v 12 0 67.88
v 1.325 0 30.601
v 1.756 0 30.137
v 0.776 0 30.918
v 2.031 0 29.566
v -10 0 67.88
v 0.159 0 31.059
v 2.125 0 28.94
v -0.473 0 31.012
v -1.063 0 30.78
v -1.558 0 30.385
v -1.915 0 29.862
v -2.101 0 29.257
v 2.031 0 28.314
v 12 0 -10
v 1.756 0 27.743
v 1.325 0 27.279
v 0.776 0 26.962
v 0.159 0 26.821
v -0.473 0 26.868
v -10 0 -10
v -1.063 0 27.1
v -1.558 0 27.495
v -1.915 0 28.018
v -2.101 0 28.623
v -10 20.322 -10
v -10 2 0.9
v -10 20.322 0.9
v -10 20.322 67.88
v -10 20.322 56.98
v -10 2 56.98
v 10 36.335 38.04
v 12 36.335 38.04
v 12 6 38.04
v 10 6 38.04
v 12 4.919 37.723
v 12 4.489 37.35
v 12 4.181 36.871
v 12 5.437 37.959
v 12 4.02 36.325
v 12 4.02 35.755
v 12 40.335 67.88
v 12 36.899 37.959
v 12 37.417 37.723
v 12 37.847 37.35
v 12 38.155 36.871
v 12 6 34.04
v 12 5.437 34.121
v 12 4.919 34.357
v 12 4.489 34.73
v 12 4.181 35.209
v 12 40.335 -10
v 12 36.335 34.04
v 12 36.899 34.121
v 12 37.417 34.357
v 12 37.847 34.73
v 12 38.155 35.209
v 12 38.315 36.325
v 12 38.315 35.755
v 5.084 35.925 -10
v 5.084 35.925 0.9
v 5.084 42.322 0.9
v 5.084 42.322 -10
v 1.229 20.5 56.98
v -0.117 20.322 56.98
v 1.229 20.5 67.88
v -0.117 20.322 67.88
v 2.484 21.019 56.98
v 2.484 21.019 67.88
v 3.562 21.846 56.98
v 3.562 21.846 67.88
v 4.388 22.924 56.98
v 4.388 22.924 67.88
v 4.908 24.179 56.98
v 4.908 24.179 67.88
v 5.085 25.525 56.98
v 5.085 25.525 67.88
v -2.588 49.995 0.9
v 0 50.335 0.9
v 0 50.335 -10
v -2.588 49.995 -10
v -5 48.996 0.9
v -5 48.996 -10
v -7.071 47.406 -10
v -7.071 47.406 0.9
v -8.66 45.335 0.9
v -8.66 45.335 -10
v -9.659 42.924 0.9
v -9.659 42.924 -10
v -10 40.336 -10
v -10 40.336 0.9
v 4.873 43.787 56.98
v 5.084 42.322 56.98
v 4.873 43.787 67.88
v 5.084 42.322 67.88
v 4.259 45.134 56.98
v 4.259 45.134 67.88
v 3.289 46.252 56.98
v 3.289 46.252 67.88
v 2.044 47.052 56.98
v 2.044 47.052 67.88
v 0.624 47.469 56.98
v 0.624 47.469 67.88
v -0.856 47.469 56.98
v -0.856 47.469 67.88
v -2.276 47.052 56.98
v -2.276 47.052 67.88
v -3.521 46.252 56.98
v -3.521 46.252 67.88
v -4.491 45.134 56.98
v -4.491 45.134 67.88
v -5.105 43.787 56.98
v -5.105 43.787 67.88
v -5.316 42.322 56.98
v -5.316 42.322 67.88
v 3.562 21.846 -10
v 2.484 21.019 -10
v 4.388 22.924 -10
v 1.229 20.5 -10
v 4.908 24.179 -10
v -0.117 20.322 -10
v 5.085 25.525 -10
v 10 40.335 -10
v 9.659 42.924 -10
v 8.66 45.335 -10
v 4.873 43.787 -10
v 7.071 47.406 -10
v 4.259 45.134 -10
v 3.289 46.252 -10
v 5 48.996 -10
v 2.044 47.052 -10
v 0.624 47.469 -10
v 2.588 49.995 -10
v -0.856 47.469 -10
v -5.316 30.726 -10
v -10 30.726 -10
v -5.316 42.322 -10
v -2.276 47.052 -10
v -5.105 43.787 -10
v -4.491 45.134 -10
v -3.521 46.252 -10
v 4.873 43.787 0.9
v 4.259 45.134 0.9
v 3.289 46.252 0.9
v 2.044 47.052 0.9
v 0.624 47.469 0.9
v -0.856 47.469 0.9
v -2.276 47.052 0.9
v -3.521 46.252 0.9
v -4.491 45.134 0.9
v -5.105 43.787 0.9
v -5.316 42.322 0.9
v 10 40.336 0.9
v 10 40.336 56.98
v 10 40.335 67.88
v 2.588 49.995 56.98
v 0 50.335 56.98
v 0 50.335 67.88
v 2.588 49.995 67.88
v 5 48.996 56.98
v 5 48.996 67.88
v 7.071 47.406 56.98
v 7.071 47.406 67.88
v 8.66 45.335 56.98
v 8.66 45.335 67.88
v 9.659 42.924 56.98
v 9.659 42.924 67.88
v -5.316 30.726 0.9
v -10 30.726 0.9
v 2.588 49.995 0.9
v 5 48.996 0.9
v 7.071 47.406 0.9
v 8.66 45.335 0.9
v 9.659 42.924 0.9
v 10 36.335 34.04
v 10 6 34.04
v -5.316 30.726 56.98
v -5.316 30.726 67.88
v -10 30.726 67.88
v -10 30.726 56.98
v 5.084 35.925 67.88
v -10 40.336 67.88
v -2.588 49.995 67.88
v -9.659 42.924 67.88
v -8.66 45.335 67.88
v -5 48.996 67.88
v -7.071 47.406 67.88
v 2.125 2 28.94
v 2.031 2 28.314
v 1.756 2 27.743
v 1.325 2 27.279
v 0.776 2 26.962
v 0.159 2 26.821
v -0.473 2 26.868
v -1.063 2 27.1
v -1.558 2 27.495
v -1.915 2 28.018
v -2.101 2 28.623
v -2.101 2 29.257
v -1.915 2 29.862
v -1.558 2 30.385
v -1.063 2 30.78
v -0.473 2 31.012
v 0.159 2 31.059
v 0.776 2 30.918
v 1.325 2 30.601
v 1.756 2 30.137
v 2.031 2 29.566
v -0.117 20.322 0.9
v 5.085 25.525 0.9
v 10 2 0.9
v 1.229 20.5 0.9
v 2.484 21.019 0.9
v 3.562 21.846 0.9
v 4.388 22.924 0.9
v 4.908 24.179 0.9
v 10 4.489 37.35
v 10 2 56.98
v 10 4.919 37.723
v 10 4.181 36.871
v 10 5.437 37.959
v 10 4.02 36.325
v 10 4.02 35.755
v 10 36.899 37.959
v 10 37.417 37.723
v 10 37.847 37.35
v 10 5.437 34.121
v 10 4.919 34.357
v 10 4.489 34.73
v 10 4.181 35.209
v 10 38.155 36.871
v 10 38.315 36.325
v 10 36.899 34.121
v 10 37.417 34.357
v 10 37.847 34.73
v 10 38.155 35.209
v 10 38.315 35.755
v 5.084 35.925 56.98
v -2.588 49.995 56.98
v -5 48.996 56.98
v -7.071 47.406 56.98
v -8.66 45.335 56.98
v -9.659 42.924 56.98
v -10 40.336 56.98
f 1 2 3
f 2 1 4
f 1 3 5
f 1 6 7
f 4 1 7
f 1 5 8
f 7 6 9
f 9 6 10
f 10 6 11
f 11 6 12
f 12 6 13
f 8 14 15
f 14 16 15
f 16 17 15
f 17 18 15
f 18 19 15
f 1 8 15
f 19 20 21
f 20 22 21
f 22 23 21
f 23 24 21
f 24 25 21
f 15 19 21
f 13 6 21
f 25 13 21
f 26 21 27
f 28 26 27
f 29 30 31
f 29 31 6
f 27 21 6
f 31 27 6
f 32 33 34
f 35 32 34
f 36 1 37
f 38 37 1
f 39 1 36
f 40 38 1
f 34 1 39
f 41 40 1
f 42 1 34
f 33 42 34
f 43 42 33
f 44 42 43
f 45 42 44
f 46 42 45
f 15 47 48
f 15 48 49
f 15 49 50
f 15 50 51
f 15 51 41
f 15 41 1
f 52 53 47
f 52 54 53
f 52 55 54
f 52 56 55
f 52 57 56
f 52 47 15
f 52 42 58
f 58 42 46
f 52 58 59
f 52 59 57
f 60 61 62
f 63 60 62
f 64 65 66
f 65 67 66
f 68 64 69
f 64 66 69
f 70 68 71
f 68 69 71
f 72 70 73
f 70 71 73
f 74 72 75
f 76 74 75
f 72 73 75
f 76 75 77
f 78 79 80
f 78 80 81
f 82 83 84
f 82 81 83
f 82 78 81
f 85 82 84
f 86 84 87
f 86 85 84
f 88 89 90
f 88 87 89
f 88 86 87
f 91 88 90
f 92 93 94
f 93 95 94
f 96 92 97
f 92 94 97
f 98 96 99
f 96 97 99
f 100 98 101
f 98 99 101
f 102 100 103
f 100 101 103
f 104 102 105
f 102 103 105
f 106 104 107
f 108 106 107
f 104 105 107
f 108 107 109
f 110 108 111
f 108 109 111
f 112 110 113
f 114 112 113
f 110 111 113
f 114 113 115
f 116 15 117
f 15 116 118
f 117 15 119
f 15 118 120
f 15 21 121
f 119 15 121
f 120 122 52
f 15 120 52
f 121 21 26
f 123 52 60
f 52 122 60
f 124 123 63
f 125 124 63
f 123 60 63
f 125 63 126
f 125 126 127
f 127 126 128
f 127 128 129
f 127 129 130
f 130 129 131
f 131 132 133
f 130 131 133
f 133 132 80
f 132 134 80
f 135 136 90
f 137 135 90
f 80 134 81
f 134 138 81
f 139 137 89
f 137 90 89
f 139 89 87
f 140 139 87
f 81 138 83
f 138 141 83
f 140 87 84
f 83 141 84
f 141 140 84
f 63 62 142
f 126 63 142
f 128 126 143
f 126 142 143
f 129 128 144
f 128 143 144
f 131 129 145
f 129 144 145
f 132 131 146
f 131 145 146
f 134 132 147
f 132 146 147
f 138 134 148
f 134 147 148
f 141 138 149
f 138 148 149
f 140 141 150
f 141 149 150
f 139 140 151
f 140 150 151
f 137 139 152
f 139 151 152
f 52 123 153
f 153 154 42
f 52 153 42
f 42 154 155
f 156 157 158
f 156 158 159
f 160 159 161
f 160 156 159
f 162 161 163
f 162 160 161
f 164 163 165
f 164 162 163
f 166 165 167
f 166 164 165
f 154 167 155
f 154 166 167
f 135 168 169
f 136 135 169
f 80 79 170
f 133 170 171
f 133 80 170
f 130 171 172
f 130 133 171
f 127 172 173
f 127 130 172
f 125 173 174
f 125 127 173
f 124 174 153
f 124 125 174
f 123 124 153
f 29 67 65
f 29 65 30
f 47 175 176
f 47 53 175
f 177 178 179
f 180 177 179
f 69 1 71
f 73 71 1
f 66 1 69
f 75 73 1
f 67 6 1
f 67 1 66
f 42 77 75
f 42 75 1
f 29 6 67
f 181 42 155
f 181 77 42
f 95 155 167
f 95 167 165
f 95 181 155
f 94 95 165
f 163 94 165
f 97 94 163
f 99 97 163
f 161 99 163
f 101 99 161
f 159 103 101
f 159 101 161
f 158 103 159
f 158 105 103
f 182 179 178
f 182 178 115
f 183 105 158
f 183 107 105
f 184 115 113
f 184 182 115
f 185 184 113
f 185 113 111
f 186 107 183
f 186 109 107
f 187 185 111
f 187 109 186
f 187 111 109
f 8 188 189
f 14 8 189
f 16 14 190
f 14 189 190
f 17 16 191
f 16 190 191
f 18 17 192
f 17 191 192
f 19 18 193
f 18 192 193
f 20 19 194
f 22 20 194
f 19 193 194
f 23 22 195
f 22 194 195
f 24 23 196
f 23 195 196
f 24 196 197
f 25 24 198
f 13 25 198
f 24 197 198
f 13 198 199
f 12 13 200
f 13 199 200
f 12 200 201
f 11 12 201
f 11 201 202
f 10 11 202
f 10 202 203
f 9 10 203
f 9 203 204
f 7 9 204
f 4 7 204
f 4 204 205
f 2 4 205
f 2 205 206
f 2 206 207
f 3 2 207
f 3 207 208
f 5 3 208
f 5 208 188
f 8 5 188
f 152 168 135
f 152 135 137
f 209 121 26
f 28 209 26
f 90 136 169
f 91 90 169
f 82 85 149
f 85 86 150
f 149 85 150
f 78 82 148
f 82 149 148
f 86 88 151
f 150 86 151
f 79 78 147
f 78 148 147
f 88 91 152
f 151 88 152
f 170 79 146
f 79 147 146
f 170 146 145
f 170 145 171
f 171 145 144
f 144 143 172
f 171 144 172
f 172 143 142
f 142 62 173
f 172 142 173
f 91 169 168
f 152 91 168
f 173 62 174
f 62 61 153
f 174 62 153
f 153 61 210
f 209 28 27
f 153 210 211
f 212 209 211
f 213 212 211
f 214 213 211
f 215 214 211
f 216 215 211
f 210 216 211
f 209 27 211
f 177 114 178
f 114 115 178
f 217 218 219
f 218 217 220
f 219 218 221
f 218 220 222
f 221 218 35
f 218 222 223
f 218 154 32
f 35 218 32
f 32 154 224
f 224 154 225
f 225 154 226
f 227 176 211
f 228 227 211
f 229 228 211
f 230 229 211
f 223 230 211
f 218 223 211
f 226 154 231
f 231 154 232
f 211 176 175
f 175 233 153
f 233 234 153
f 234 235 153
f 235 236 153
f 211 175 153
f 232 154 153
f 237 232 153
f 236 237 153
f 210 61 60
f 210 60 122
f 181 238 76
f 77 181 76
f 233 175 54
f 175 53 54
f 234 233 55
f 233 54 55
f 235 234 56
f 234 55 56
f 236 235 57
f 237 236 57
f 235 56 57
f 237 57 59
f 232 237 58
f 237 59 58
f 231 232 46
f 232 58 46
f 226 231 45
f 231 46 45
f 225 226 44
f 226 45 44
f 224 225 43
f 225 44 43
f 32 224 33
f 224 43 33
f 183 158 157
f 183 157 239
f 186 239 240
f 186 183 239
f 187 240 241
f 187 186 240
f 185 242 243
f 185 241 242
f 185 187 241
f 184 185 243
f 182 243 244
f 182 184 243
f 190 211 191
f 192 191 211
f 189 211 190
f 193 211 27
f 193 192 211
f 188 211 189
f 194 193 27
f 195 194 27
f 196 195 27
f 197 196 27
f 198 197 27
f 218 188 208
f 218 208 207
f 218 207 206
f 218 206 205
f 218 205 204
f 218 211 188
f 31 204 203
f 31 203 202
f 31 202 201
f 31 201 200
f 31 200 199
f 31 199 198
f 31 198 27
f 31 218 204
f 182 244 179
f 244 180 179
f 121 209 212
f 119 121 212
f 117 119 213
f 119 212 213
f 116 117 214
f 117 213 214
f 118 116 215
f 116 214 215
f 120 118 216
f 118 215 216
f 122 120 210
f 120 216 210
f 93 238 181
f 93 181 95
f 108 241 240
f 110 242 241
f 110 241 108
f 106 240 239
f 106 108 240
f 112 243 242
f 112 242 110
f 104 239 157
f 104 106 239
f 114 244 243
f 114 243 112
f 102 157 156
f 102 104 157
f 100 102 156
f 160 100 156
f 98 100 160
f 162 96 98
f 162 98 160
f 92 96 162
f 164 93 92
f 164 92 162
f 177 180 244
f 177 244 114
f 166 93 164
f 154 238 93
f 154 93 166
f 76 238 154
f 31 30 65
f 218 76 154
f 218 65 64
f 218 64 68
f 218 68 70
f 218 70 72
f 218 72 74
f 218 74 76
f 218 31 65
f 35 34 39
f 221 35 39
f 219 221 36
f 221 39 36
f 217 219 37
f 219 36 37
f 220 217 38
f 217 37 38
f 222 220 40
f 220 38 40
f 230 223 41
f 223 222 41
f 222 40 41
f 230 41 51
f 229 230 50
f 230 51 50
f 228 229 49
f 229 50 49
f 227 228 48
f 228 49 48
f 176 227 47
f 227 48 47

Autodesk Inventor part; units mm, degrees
ref_plane "YZ Plane" through (0, 0, 0) normal (1, 0, 0) x (0, 1, 0)
ref_plane "XZ Plane" through (0, 0, 0) normal (0, 1, 0) x (-1, 0, 0)
ref_plane "XY Plane" through (0, 0, 0) normal (0, 0, 1) x (1, 0, 0)
sketch "Sketch1" plane through (0, 0, 0) normal (0, 1, 0) x (-1, 0, 0)
  line L0 (10, 67.88) -> (-10, 67.88)
  line L1 (-10, 67.88) -> (-10, -10)
  line L2 (-10, -10) -> (10, -10)
  line L3 (10, -10) -> (10, 67.88)
  point P0 (0, 0)
  dimension "d0" = 20
  dimension "d1" = 77.88
extrude "Extrusion1" add sketch "Sketch1" along normal blind 2
sketch "Sketch2" plane through (0, 2, 0) normal (0, 1, 0) x (1, 0, 0)
  line L0 (-10, -67.88) -> (10, -67.88) projected
  line L1 (0, -67.88) -> (-6.35, -67.88)
  line L2 (-6.35, -56.98) -> (6.35, -56.98)
  line L3 (6.35, -67.88) -> (0, -67.88)
  line L4 (10, 10) -> (-10, 10) projected
  line L5 (-6.35, -0.9) -> (6.35, -0.9)
  line L6 (-6.35, 10) -> (6.35, 10)
  line L7 (-6.35, -67.88) -> (-10, -67.88)
  line L8 (-10, 10) -> (-10, -67.88) projected
  line L9 (-10, -56.98) -> (-6.35, -56.98)
  line L10 (6.35, -67.88) -> (10, -67.88)
  line L11 (10, -67.88) -> (10, 10) projected
  line L12 (10, -56.98) -> (6.35, -56.98)
  line L13 (6.35, -0.9) -> (10, -0.9)
  line L14 (10, 10) -> (6.35, 10)
  line L15 (10, -0.9) -> (10, 10)
  line L16 (10, -67.88) -> (10, -56.98)
  line L17 (-10, -67.88) -> (-10, -56.98)
  line L18 (-6.35, -0.9) -> (-10, -0.9)
  line L19 (-10, -0.9) -> (-10, 10)
  line L20 (-10, 10) -> (-6.35, 10)
  point P0 (0, 0)
  dimension "d4" = 6.35
  dimension "d5" = 10.9
  dimension "d6" = 12.7
  dimension "d7" = 10.9
extrude "Extrusion2" add sketch "Sketch2" along normal blind 48.3354 contours L8 L9 L2 L12 L11 L0 | L8 L4 L11 L13 L5 L18
sketch "Sketch9" plane through (-10, 0, 67.88) normal (0, 0, 1) x (1, 0, 0)
  arc A0 (15.084, 42.3223) -> (4.684, 42.3223) centre (9.884, 42.3223) ccw
  line L0 (15.084, 35.9247) -> (15.084, 42.3223)
  line L1 (4.684, 41.1247) -> (4.684, 42.3223)
  arc A1 (15.084, 42.3223) -> (4.684, 42.3223) centre (9.884, 42.3223) ccw
  line L2 (4.684, 42.3223) -> (4.684, 35.9247)
  line L3 (9.8827, 20.3222) -> (-0.0013, 20.3222)
  line L4 (-0.0013, 30.726) -> (-0.0013, 20.3222)
  line L5 (4.684, 35.9247) -> (4.684, 30.726)
  line L6 (15.084, 35.9247) -> (15.0853, 25.5254)
  arc A2 (15.084, 35.9247) -> (15.084, 35.9251) centre (9.884, 35.9243) ccw
  line L7 (4.684, 30.726) -> (-0.0013, 30.726)
  arc A3 (9.8827, 20.3222) -> (15.0853, 25.5254) centre (9.8827, 25.5248) ccw
  point P0 (10, 0)
fillet "Fillet4" radius 10 4 edges at (10, 50.3354, 62.43) (-10, 50.3354, 62.43) (-10, 50.3354, -4.55) (10, 50.3354, -4.55)
sketch "Sketch10" plane through (0, 2, 0) normal (0, 1, 0) x (1, 0, 0)
  line L0 (10, -67.88) -> (-10, -67.88) projected
  line L1 (-10, 10) -> (10, 10) projected
  line L2 (10, -56.98) -> (10, -0.9) projected
  line L3 (-10, -0.9) -> (-10, -56.98) projected
  line L4 (10, -28.94) -> (-10, -28.94)
  circle A0 centre (0, -28.94) radius 2.125
  point P0 (0, 0)
  dimension "d53" = 77.88
  dimension "d54" = 4.25
extrude "Extrusion10" cut sketch "Sketch10" against normal blind 2
extrude "Extrusion11" cut sketch "Sketch9" against normal through all
sketch "Sketch11" plane through (10, 0, 67.88) normal (1, 0, 0) x (0, 0, -1)
  line L0 (0, 0) -> (0, 20.3222) projected
  line L1 (77.88, 30.726) -> (77.88, 40.3354) projected
  line L2 (0, 0) -> (77.88, 0)
  line L3 (77.88, 0) -> (77.88, 40.3354)
  line L4 (77.88, 40.3354) -> (0, 40.3354)
  line L5 (0, 40.3354) -> (0, 0)
  point P0 (67.88, 0)
extrude "Extrusion12" add sketch "Sketch11" along normal blind 2
sketch "Sketch12" plane through (12, 0, 67.88) normal (1, 0, 0) x (0, 0, -1)
  line L0 (10.9, 40.3354) -> (0, 40.3354) projected
  line L1 (77.88, 30.726) -> (77.88, 40.3354) projected
  line L2 (0, 40.3354) -> (77.88, 40.3354)
  line L3 (77.88, 40.3354) -> (0, 40.3354) projected
  line L4 (38.94, 40.3354) -> (64.34, 40.3354)
  line L5 (38.94, 40.3354) -> (13.54, 40.3354)
  line L6 (77.88, 0) -> (0, 0) projected
  line L7 (13.54, 40.3354) -> (64.34, 40.3354)
  line L8 (64.34, 40.3354) -> (64.34, 0)
  line L9 (64.34, 0) -> (13.54, 0)
  line L10 (13.54, 0) -> (13.54, 40.3354)
  line L11 (13.54, 0) -> (31.84, 0)
  line L12 (31.84, 0) -> (31.84, 6)
  arc A0 (33.84, 36.3354) -> (29.84, 36.3354) centre (31.84, 36.3354) ccw
  arc A1 (29.84, 6) -> (33.84, 6) centre (31.84, 6) ccw
  line L13 (29.84, 36.3354) -> (29.84, 6)
  line L14 (33.84, 36.3354) -> (33.84, 6)
  line L15 (31.84, 36.3354) -> (13.54, 36.3354)
  point P0 (67.88, 0)
  dimension "d65" = 25.4
  dimension "d66" = 25.4
  dimension "d67" = 50.8
  dimension "d68" = 18.3
  dimension "d69" = 6
  dimension "d71" = 4
  dimension "d72" = 4
  dimension "d75" = 18.3
extrude "Extrusion13" cut sketch "Sketch12" against normal blind 2 contours A0 L14 A1 L13
properties part number "6 Backet Adjustment 2.0"
